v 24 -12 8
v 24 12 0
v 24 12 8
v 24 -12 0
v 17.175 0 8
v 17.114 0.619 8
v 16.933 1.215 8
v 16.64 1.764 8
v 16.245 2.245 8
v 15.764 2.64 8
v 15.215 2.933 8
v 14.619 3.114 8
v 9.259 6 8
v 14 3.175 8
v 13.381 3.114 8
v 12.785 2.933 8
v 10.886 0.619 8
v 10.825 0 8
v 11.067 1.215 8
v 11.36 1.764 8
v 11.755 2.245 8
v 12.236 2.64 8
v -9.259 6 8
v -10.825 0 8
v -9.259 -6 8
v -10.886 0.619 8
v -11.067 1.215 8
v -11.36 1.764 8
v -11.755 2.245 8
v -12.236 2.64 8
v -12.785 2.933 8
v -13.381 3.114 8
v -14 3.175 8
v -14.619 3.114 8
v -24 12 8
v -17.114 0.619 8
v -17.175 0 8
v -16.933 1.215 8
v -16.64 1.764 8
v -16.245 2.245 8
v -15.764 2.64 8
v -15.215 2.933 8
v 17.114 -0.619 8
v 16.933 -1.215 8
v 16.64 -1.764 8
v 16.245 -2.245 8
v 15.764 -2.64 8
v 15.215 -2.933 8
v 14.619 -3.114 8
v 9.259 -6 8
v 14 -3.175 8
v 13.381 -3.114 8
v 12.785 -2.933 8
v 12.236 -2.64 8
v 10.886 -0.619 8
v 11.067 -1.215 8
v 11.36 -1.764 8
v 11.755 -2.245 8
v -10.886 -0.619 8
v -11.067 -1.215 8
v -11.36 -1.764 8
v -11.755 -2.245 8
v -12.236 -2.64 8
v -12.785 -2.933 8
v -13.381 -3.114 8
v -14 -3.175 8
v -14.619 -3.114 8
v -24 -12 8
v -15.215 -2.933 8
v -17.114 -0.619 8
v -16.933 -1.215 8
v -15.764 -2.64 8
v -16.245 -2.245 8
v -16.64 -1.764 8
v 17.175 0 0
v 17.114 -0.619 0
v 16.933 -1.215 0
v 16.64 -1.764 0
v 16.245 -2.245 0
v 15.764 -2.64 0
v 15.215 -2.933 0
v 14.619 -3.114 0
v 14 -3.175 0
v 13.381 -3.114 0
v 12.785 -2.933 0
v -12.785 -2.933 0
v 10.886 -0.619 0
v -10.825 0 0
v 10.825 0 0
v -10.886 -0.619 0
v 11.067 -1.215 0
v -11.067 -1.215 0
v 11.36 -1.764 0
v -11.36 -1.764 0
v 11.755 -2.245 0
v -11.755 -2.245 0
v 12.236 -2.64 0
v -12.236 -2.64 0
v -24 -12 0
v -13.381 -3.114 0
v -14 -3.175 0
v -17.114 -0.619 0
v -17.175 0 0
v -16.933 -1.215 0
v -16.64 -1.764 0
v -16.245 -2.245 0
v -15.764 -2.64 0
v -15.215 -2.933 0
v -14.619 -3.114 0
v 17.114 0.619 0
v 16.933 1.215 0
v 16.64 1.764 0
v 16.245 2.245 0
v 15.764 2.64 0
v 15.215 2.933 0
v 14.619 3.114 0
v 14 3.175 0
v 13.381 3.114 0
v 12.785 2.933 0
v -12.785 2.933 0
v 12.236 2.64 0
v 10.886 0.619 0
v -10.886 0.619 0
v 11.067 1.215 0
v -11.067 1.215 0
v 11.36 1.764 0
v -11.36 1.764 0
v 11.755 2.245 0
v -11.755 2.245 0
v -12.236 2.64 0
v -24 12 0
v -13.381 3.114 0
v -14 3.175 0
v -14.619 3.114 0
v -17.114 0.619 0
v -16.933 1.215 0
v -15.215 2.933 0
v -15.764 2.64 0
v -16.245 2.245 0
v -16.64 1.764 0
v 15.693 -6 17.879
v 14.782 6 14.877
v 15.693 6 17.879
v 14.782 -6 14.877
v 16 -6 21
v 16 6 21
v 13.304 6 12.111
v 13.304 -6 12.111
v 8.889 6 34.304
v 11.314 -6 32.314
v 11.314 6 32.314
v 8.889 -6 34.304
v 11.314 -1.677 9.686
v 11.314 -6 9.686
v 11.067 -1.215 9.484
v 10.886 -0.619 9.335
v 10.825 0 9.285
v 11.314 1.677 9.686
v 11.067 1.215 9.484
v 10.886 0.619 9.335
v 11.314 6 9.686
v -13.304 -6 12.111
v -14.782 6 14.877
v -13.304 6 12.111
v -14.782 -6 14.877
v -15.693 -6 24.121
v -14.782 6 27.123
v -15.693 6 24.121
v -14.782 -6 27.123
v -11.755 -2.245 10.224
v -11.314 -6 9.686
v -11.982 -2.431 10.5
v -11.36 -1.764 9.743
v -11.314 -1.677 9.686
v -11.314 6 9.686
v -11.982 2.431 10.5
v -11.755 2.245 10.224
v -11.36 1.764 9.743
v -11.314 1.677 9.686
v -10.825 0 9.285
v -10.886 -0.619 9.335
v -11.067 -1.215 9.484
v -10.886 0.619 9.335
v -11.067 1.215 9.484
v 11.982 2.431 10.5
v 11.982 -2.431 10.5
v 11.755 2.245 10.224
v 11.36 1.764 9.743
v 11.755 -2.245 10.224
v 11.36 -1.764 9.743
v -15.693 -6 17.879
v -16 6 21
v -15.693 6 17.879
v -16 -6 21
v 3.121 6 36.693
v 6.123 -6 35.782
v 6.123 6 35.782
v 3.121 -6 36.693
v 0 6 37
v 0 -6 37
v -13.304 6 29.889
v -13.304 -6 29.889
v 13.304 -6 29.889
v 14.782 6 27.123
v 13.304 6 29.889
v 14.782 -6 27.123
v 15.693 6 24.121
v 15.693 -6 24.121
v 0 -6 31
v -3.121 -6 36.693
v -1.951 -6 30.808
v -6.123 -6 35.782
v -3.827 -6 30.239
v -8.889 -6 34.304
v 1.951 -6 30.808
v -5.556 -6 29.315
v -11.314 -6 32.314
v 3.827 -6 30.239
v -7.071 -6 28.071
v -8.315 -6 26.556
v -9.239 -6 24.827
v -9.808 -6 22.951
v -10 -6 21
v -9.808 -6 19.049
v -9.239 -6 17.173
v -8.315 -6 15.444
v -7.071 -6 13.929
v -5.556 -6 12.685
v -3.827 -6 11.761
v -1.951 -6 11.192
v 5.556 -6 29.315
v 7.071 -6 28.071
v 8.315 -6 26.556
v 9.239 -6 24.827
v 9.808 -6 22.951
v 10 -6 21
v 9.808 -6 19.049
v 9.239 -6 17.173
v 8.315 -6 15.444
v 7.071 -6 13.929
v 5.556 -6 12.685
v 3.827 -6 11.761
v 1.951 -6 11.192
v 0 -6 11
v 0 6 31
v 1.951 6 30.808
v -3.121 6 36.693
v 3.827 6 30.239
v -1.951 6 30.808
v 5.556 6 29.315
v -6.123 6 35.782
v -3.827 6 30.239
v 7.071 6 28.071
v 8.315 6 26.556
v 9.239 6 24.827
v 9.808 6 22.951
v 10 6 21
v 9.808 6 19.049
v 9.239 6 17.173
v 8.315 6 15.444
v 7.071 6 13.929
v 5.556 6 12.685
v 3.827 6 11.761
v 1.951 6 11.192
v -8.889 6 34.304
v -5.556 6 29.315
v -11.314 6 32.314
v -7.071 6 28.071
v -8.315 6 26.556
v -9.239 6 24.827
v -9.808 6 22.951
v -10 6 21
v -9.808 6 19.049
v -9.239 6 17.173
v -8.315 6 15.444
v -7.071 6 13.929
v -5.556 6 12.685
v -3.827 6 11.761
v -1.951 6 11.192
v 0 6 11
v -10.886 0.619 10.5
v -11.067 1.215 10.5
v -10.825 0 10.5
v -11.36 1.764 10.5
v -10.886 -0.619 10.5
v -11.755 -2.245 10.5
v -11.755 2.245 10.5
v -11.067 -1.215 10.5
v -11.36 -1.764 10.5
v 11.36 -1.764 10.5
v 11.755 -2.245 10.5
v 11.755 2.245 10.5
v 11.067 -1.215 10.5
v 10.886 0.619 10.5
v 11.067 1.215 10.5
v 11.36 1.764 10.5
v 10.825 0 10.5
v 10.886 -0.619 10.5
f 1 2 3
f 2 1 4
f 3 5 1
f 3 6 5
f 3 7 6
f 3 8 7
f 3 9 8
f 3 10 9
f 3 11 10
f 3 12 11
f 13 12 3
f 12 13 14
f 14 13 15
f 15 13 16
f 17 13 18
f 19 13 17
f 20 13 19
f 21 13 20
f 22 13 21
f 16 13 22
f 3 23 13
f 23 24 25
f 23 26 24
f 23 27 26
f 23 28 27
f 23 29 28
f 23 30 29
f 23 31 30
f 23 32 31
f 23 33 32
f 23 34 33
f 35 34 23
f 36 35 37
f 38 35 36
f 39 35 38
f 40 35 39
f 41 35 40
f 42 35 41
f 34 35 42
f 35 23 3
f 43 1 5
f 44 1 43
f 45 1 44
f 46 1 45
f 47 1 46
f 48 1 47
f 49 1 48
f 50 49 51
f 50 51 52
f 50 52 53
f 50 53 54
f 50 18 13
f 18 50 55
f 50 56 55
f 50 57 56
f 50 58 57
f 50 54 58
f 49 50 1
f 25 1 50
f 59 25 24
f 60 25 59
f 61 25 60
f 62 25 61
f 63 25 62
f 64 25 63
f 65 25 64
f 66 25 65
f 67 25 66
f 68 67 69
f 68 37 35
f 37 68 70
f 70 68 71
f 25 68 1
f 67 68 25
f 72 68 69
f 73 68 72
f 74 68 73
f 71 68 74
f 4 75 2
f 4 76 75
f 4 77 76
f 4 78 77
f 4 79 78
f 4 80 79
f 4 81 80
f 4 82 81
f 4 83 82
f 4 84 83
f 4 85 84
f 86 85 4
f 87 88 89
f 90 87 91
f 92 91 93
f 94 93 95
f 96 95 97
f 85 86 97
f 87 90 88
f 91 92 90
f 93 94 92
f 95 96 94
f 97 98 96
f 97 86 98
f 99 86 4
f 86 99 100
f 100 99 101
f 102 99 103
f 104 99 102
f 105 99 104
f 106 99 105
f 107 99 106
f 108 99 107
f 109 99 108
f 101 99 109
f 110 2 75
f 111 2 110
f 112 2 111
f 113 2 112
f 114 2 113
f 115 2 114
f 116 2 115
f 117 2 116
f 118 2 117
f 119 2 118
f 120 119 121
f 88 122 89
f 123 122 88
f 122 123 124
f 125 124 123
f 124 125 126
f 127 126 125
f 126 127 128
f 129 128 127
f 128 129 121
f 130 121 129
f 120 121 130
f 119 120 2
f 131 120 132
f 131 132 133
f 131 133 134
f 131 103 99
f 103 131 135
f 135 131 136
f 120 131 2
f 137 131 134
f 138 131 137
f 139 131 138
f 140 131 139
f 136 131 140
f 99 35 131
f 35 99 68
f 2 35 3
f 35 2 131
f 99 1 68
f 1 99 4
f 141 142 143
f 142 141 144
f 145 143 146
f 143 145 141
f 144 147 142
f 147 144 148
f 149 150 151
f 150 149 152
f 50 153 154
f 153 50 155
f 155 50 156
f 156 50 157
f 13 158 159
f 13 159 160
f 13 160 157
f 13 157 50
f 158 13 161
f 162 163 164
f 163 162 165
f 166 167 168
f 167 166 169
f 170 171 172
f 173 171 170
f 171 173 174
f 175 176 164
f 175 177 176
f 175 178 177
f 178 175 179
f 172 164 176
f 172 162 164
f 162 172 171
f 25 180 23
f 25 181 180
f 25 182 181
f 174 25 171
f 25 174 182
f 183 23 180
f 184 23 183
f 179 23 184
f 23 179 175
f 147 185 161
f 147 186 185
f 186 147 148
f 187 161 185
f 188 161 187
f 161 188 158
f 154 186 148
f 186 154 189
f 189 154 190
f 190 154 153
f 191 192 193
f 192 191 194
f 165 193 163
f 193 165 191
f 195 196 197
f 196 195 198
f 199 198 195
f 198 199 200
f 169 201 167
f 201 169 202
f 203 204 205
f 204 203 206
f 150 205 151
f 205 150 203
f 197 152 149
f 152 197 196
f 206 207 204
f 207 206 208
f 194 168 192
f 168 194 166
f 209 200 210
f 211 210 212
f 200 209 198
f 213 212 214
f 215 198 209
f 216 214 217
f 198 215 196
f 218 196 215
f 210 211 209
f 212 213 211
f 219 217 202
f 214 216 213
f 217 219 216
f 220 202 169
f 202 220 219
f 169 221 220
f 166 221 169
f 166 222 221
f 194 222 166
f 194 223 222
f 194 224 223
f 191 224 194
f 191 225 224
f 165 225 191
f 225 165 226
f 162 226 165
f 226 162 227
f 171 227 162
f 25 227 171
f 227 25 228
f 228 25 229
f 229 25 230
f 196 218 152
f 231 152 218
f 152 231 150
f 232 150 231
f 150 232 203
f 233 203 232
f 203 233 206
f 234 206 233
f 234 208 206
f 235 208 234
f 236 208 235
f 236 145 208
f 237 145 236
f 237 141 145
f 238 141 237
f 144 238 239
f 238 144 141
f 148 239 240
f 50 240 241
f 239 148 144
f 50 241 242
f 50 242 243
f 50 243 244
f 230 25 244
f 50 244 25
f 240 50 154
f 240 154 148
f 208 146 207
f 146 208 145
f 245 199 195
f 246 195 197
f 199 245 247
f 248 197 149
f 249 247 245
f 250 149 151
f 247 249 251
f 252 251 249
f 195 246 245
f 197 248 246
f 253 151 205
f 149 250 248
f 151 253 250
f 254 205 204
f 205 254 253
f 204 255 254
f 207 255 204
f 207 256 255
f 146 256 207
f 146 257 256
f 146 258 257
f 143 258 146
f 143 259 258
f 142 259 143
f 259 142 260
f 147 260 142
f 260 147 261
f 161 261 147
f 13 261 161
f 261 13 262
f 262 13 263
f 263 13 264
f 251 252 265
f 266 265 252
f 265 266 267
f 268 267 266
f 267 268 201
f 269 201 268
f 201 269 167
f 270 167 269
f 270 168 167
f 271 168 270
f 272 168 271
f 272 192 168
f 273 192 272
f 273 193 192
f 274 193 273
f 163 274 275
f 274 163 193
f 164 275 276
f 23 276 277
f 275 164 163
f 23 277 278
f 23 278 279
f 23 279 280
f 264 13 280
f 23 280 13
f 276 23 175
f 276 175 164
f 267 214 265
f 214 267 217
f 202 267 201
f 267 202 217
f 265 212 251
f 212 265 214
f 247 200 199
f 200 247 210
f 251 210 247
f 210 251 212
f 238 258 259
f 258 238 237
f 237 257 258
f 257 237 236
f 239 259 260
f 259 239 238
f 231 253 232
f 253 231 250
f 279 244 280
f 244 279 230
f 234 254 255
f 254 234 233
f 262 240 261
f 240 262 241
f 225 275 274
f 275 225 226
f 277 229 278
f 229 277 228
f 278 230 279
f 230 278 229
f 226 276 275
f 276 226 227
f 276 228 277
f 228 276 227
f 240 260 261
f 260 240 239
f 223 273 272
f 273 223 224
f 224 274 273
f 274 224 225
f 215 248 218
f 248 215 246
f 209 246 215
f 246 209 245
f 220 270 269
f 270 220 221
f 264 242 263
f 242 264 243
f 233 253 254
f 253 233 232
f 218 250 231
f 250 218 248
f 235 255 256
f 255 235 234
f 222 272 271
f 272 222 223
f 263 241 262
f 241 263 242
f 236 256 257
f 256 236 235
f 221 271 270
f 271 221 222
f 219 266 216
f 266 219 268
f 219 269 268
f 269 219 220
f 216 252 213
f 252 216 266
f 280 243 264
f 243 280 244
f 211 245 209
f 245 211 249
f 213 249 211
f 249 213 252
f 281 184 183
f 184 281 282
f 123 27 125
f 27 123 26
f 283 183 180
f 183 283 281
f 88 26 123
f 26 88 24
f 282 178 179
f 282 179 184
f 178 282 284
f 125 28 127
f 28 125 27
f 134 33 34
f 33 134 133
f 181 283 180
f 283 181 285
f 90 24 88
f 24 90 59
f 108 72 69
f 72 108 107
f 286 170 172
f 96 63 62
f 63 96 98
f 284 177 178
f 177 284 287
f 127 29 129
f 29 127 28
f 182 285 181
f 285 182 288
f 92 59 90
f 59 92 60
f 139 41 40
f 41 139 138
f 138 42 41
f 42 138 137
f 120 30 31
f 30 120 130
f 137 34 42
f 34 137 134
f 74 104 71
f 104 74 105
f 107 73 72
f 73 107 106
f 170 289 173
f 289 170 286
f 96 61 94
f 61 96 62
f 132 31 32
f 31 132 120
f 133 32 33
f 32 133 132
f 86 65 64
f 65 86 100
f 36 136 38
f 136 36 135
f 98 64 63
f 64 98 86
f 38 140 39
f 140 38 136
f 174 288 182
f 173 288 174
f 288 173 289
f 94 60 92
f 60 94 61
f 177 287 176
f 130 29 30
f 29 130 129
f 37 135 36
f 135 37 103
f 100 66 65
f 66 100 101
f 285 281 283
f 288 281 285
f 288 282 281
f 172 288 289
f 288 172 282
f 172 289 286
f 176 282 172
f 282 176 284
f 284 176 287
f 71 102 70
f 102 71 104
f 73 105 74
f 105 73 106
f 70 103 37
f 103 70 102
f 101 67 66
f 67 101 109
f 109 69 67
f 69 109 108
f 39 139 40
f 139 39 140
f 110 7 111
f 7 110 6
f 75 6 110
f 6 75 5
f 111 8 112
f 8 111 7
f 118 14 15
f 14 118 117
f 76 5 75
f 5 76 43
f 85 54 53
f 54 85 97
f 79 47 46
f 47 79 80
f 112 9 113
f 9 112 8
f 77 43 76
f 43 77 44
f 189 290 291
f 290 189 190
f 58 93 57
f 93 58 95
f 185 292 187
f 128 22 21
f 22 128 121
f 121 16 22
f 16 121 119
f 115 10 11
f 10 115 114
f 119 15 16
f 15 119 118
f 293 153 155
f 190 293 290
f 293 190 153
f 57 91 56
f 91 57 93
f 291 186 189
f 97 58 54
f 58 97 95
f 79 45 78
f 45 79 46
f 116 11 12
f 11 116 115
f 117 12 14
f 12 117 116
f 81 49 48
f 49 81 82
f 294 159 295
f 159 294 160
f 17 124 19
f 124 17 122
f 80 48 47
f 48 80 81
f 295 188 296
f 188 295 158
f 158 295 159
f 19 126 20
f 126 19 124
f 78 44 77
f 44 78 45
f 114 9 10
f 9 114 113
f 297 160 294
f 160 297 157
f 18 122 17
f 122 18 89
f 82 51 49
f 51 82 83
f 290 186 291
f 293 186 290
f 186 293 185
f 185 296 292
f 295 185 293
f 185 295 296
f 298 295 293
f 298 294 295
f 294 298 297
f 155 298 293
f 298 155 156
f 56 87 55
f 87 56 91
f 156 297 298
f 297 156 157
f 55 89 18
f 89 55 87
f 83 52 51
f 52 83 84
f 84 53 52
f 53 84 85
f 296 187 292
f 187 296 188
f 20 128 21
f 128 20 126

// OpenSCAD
$fn = 32;

// ----------------------------------------------------------------------
// Deck eye: 32 mm eye on a 48 mm base
// ----------------------------------------------------------------------

// --- parameters (mm) ---
base_l = 48;              // base length
base_w = 24;              // base width
base_t = 8;               // base thickness
eye_r = 16;               // eye outside radius
eye_bore = 20;            // eye bore diameter
eye_w = 12;               // eye thickness
eye_z = 21;               // eye centre height
holes_d = 6.35;           // fixing holes
hole_x = 14;              // fixing hole spacing

difference() {
  union() {
    translate([-24, -12, 0]) cube([base_l, base_w, base_t]);
    /* eye standing upright, its foot sunk 3 mm into the base */
    translate([0, -6, 21]) rotate([-90, 0, 0]) cylinder(h = 12, d = 32);
  }
  /* eye bore, 2.5 mm clear of both faces */
  translate([0, -8.5, 21]) rotate([-90, 0, 0]) cylinder(h = 17, d = 20);
  translate([-14, 0, -2.5]) cylinder(h = base_t + 5, d = holes_d);
  translate([14, 0, -2.5]) cylinder(h = base_t + 5, d = holes_d);
}
